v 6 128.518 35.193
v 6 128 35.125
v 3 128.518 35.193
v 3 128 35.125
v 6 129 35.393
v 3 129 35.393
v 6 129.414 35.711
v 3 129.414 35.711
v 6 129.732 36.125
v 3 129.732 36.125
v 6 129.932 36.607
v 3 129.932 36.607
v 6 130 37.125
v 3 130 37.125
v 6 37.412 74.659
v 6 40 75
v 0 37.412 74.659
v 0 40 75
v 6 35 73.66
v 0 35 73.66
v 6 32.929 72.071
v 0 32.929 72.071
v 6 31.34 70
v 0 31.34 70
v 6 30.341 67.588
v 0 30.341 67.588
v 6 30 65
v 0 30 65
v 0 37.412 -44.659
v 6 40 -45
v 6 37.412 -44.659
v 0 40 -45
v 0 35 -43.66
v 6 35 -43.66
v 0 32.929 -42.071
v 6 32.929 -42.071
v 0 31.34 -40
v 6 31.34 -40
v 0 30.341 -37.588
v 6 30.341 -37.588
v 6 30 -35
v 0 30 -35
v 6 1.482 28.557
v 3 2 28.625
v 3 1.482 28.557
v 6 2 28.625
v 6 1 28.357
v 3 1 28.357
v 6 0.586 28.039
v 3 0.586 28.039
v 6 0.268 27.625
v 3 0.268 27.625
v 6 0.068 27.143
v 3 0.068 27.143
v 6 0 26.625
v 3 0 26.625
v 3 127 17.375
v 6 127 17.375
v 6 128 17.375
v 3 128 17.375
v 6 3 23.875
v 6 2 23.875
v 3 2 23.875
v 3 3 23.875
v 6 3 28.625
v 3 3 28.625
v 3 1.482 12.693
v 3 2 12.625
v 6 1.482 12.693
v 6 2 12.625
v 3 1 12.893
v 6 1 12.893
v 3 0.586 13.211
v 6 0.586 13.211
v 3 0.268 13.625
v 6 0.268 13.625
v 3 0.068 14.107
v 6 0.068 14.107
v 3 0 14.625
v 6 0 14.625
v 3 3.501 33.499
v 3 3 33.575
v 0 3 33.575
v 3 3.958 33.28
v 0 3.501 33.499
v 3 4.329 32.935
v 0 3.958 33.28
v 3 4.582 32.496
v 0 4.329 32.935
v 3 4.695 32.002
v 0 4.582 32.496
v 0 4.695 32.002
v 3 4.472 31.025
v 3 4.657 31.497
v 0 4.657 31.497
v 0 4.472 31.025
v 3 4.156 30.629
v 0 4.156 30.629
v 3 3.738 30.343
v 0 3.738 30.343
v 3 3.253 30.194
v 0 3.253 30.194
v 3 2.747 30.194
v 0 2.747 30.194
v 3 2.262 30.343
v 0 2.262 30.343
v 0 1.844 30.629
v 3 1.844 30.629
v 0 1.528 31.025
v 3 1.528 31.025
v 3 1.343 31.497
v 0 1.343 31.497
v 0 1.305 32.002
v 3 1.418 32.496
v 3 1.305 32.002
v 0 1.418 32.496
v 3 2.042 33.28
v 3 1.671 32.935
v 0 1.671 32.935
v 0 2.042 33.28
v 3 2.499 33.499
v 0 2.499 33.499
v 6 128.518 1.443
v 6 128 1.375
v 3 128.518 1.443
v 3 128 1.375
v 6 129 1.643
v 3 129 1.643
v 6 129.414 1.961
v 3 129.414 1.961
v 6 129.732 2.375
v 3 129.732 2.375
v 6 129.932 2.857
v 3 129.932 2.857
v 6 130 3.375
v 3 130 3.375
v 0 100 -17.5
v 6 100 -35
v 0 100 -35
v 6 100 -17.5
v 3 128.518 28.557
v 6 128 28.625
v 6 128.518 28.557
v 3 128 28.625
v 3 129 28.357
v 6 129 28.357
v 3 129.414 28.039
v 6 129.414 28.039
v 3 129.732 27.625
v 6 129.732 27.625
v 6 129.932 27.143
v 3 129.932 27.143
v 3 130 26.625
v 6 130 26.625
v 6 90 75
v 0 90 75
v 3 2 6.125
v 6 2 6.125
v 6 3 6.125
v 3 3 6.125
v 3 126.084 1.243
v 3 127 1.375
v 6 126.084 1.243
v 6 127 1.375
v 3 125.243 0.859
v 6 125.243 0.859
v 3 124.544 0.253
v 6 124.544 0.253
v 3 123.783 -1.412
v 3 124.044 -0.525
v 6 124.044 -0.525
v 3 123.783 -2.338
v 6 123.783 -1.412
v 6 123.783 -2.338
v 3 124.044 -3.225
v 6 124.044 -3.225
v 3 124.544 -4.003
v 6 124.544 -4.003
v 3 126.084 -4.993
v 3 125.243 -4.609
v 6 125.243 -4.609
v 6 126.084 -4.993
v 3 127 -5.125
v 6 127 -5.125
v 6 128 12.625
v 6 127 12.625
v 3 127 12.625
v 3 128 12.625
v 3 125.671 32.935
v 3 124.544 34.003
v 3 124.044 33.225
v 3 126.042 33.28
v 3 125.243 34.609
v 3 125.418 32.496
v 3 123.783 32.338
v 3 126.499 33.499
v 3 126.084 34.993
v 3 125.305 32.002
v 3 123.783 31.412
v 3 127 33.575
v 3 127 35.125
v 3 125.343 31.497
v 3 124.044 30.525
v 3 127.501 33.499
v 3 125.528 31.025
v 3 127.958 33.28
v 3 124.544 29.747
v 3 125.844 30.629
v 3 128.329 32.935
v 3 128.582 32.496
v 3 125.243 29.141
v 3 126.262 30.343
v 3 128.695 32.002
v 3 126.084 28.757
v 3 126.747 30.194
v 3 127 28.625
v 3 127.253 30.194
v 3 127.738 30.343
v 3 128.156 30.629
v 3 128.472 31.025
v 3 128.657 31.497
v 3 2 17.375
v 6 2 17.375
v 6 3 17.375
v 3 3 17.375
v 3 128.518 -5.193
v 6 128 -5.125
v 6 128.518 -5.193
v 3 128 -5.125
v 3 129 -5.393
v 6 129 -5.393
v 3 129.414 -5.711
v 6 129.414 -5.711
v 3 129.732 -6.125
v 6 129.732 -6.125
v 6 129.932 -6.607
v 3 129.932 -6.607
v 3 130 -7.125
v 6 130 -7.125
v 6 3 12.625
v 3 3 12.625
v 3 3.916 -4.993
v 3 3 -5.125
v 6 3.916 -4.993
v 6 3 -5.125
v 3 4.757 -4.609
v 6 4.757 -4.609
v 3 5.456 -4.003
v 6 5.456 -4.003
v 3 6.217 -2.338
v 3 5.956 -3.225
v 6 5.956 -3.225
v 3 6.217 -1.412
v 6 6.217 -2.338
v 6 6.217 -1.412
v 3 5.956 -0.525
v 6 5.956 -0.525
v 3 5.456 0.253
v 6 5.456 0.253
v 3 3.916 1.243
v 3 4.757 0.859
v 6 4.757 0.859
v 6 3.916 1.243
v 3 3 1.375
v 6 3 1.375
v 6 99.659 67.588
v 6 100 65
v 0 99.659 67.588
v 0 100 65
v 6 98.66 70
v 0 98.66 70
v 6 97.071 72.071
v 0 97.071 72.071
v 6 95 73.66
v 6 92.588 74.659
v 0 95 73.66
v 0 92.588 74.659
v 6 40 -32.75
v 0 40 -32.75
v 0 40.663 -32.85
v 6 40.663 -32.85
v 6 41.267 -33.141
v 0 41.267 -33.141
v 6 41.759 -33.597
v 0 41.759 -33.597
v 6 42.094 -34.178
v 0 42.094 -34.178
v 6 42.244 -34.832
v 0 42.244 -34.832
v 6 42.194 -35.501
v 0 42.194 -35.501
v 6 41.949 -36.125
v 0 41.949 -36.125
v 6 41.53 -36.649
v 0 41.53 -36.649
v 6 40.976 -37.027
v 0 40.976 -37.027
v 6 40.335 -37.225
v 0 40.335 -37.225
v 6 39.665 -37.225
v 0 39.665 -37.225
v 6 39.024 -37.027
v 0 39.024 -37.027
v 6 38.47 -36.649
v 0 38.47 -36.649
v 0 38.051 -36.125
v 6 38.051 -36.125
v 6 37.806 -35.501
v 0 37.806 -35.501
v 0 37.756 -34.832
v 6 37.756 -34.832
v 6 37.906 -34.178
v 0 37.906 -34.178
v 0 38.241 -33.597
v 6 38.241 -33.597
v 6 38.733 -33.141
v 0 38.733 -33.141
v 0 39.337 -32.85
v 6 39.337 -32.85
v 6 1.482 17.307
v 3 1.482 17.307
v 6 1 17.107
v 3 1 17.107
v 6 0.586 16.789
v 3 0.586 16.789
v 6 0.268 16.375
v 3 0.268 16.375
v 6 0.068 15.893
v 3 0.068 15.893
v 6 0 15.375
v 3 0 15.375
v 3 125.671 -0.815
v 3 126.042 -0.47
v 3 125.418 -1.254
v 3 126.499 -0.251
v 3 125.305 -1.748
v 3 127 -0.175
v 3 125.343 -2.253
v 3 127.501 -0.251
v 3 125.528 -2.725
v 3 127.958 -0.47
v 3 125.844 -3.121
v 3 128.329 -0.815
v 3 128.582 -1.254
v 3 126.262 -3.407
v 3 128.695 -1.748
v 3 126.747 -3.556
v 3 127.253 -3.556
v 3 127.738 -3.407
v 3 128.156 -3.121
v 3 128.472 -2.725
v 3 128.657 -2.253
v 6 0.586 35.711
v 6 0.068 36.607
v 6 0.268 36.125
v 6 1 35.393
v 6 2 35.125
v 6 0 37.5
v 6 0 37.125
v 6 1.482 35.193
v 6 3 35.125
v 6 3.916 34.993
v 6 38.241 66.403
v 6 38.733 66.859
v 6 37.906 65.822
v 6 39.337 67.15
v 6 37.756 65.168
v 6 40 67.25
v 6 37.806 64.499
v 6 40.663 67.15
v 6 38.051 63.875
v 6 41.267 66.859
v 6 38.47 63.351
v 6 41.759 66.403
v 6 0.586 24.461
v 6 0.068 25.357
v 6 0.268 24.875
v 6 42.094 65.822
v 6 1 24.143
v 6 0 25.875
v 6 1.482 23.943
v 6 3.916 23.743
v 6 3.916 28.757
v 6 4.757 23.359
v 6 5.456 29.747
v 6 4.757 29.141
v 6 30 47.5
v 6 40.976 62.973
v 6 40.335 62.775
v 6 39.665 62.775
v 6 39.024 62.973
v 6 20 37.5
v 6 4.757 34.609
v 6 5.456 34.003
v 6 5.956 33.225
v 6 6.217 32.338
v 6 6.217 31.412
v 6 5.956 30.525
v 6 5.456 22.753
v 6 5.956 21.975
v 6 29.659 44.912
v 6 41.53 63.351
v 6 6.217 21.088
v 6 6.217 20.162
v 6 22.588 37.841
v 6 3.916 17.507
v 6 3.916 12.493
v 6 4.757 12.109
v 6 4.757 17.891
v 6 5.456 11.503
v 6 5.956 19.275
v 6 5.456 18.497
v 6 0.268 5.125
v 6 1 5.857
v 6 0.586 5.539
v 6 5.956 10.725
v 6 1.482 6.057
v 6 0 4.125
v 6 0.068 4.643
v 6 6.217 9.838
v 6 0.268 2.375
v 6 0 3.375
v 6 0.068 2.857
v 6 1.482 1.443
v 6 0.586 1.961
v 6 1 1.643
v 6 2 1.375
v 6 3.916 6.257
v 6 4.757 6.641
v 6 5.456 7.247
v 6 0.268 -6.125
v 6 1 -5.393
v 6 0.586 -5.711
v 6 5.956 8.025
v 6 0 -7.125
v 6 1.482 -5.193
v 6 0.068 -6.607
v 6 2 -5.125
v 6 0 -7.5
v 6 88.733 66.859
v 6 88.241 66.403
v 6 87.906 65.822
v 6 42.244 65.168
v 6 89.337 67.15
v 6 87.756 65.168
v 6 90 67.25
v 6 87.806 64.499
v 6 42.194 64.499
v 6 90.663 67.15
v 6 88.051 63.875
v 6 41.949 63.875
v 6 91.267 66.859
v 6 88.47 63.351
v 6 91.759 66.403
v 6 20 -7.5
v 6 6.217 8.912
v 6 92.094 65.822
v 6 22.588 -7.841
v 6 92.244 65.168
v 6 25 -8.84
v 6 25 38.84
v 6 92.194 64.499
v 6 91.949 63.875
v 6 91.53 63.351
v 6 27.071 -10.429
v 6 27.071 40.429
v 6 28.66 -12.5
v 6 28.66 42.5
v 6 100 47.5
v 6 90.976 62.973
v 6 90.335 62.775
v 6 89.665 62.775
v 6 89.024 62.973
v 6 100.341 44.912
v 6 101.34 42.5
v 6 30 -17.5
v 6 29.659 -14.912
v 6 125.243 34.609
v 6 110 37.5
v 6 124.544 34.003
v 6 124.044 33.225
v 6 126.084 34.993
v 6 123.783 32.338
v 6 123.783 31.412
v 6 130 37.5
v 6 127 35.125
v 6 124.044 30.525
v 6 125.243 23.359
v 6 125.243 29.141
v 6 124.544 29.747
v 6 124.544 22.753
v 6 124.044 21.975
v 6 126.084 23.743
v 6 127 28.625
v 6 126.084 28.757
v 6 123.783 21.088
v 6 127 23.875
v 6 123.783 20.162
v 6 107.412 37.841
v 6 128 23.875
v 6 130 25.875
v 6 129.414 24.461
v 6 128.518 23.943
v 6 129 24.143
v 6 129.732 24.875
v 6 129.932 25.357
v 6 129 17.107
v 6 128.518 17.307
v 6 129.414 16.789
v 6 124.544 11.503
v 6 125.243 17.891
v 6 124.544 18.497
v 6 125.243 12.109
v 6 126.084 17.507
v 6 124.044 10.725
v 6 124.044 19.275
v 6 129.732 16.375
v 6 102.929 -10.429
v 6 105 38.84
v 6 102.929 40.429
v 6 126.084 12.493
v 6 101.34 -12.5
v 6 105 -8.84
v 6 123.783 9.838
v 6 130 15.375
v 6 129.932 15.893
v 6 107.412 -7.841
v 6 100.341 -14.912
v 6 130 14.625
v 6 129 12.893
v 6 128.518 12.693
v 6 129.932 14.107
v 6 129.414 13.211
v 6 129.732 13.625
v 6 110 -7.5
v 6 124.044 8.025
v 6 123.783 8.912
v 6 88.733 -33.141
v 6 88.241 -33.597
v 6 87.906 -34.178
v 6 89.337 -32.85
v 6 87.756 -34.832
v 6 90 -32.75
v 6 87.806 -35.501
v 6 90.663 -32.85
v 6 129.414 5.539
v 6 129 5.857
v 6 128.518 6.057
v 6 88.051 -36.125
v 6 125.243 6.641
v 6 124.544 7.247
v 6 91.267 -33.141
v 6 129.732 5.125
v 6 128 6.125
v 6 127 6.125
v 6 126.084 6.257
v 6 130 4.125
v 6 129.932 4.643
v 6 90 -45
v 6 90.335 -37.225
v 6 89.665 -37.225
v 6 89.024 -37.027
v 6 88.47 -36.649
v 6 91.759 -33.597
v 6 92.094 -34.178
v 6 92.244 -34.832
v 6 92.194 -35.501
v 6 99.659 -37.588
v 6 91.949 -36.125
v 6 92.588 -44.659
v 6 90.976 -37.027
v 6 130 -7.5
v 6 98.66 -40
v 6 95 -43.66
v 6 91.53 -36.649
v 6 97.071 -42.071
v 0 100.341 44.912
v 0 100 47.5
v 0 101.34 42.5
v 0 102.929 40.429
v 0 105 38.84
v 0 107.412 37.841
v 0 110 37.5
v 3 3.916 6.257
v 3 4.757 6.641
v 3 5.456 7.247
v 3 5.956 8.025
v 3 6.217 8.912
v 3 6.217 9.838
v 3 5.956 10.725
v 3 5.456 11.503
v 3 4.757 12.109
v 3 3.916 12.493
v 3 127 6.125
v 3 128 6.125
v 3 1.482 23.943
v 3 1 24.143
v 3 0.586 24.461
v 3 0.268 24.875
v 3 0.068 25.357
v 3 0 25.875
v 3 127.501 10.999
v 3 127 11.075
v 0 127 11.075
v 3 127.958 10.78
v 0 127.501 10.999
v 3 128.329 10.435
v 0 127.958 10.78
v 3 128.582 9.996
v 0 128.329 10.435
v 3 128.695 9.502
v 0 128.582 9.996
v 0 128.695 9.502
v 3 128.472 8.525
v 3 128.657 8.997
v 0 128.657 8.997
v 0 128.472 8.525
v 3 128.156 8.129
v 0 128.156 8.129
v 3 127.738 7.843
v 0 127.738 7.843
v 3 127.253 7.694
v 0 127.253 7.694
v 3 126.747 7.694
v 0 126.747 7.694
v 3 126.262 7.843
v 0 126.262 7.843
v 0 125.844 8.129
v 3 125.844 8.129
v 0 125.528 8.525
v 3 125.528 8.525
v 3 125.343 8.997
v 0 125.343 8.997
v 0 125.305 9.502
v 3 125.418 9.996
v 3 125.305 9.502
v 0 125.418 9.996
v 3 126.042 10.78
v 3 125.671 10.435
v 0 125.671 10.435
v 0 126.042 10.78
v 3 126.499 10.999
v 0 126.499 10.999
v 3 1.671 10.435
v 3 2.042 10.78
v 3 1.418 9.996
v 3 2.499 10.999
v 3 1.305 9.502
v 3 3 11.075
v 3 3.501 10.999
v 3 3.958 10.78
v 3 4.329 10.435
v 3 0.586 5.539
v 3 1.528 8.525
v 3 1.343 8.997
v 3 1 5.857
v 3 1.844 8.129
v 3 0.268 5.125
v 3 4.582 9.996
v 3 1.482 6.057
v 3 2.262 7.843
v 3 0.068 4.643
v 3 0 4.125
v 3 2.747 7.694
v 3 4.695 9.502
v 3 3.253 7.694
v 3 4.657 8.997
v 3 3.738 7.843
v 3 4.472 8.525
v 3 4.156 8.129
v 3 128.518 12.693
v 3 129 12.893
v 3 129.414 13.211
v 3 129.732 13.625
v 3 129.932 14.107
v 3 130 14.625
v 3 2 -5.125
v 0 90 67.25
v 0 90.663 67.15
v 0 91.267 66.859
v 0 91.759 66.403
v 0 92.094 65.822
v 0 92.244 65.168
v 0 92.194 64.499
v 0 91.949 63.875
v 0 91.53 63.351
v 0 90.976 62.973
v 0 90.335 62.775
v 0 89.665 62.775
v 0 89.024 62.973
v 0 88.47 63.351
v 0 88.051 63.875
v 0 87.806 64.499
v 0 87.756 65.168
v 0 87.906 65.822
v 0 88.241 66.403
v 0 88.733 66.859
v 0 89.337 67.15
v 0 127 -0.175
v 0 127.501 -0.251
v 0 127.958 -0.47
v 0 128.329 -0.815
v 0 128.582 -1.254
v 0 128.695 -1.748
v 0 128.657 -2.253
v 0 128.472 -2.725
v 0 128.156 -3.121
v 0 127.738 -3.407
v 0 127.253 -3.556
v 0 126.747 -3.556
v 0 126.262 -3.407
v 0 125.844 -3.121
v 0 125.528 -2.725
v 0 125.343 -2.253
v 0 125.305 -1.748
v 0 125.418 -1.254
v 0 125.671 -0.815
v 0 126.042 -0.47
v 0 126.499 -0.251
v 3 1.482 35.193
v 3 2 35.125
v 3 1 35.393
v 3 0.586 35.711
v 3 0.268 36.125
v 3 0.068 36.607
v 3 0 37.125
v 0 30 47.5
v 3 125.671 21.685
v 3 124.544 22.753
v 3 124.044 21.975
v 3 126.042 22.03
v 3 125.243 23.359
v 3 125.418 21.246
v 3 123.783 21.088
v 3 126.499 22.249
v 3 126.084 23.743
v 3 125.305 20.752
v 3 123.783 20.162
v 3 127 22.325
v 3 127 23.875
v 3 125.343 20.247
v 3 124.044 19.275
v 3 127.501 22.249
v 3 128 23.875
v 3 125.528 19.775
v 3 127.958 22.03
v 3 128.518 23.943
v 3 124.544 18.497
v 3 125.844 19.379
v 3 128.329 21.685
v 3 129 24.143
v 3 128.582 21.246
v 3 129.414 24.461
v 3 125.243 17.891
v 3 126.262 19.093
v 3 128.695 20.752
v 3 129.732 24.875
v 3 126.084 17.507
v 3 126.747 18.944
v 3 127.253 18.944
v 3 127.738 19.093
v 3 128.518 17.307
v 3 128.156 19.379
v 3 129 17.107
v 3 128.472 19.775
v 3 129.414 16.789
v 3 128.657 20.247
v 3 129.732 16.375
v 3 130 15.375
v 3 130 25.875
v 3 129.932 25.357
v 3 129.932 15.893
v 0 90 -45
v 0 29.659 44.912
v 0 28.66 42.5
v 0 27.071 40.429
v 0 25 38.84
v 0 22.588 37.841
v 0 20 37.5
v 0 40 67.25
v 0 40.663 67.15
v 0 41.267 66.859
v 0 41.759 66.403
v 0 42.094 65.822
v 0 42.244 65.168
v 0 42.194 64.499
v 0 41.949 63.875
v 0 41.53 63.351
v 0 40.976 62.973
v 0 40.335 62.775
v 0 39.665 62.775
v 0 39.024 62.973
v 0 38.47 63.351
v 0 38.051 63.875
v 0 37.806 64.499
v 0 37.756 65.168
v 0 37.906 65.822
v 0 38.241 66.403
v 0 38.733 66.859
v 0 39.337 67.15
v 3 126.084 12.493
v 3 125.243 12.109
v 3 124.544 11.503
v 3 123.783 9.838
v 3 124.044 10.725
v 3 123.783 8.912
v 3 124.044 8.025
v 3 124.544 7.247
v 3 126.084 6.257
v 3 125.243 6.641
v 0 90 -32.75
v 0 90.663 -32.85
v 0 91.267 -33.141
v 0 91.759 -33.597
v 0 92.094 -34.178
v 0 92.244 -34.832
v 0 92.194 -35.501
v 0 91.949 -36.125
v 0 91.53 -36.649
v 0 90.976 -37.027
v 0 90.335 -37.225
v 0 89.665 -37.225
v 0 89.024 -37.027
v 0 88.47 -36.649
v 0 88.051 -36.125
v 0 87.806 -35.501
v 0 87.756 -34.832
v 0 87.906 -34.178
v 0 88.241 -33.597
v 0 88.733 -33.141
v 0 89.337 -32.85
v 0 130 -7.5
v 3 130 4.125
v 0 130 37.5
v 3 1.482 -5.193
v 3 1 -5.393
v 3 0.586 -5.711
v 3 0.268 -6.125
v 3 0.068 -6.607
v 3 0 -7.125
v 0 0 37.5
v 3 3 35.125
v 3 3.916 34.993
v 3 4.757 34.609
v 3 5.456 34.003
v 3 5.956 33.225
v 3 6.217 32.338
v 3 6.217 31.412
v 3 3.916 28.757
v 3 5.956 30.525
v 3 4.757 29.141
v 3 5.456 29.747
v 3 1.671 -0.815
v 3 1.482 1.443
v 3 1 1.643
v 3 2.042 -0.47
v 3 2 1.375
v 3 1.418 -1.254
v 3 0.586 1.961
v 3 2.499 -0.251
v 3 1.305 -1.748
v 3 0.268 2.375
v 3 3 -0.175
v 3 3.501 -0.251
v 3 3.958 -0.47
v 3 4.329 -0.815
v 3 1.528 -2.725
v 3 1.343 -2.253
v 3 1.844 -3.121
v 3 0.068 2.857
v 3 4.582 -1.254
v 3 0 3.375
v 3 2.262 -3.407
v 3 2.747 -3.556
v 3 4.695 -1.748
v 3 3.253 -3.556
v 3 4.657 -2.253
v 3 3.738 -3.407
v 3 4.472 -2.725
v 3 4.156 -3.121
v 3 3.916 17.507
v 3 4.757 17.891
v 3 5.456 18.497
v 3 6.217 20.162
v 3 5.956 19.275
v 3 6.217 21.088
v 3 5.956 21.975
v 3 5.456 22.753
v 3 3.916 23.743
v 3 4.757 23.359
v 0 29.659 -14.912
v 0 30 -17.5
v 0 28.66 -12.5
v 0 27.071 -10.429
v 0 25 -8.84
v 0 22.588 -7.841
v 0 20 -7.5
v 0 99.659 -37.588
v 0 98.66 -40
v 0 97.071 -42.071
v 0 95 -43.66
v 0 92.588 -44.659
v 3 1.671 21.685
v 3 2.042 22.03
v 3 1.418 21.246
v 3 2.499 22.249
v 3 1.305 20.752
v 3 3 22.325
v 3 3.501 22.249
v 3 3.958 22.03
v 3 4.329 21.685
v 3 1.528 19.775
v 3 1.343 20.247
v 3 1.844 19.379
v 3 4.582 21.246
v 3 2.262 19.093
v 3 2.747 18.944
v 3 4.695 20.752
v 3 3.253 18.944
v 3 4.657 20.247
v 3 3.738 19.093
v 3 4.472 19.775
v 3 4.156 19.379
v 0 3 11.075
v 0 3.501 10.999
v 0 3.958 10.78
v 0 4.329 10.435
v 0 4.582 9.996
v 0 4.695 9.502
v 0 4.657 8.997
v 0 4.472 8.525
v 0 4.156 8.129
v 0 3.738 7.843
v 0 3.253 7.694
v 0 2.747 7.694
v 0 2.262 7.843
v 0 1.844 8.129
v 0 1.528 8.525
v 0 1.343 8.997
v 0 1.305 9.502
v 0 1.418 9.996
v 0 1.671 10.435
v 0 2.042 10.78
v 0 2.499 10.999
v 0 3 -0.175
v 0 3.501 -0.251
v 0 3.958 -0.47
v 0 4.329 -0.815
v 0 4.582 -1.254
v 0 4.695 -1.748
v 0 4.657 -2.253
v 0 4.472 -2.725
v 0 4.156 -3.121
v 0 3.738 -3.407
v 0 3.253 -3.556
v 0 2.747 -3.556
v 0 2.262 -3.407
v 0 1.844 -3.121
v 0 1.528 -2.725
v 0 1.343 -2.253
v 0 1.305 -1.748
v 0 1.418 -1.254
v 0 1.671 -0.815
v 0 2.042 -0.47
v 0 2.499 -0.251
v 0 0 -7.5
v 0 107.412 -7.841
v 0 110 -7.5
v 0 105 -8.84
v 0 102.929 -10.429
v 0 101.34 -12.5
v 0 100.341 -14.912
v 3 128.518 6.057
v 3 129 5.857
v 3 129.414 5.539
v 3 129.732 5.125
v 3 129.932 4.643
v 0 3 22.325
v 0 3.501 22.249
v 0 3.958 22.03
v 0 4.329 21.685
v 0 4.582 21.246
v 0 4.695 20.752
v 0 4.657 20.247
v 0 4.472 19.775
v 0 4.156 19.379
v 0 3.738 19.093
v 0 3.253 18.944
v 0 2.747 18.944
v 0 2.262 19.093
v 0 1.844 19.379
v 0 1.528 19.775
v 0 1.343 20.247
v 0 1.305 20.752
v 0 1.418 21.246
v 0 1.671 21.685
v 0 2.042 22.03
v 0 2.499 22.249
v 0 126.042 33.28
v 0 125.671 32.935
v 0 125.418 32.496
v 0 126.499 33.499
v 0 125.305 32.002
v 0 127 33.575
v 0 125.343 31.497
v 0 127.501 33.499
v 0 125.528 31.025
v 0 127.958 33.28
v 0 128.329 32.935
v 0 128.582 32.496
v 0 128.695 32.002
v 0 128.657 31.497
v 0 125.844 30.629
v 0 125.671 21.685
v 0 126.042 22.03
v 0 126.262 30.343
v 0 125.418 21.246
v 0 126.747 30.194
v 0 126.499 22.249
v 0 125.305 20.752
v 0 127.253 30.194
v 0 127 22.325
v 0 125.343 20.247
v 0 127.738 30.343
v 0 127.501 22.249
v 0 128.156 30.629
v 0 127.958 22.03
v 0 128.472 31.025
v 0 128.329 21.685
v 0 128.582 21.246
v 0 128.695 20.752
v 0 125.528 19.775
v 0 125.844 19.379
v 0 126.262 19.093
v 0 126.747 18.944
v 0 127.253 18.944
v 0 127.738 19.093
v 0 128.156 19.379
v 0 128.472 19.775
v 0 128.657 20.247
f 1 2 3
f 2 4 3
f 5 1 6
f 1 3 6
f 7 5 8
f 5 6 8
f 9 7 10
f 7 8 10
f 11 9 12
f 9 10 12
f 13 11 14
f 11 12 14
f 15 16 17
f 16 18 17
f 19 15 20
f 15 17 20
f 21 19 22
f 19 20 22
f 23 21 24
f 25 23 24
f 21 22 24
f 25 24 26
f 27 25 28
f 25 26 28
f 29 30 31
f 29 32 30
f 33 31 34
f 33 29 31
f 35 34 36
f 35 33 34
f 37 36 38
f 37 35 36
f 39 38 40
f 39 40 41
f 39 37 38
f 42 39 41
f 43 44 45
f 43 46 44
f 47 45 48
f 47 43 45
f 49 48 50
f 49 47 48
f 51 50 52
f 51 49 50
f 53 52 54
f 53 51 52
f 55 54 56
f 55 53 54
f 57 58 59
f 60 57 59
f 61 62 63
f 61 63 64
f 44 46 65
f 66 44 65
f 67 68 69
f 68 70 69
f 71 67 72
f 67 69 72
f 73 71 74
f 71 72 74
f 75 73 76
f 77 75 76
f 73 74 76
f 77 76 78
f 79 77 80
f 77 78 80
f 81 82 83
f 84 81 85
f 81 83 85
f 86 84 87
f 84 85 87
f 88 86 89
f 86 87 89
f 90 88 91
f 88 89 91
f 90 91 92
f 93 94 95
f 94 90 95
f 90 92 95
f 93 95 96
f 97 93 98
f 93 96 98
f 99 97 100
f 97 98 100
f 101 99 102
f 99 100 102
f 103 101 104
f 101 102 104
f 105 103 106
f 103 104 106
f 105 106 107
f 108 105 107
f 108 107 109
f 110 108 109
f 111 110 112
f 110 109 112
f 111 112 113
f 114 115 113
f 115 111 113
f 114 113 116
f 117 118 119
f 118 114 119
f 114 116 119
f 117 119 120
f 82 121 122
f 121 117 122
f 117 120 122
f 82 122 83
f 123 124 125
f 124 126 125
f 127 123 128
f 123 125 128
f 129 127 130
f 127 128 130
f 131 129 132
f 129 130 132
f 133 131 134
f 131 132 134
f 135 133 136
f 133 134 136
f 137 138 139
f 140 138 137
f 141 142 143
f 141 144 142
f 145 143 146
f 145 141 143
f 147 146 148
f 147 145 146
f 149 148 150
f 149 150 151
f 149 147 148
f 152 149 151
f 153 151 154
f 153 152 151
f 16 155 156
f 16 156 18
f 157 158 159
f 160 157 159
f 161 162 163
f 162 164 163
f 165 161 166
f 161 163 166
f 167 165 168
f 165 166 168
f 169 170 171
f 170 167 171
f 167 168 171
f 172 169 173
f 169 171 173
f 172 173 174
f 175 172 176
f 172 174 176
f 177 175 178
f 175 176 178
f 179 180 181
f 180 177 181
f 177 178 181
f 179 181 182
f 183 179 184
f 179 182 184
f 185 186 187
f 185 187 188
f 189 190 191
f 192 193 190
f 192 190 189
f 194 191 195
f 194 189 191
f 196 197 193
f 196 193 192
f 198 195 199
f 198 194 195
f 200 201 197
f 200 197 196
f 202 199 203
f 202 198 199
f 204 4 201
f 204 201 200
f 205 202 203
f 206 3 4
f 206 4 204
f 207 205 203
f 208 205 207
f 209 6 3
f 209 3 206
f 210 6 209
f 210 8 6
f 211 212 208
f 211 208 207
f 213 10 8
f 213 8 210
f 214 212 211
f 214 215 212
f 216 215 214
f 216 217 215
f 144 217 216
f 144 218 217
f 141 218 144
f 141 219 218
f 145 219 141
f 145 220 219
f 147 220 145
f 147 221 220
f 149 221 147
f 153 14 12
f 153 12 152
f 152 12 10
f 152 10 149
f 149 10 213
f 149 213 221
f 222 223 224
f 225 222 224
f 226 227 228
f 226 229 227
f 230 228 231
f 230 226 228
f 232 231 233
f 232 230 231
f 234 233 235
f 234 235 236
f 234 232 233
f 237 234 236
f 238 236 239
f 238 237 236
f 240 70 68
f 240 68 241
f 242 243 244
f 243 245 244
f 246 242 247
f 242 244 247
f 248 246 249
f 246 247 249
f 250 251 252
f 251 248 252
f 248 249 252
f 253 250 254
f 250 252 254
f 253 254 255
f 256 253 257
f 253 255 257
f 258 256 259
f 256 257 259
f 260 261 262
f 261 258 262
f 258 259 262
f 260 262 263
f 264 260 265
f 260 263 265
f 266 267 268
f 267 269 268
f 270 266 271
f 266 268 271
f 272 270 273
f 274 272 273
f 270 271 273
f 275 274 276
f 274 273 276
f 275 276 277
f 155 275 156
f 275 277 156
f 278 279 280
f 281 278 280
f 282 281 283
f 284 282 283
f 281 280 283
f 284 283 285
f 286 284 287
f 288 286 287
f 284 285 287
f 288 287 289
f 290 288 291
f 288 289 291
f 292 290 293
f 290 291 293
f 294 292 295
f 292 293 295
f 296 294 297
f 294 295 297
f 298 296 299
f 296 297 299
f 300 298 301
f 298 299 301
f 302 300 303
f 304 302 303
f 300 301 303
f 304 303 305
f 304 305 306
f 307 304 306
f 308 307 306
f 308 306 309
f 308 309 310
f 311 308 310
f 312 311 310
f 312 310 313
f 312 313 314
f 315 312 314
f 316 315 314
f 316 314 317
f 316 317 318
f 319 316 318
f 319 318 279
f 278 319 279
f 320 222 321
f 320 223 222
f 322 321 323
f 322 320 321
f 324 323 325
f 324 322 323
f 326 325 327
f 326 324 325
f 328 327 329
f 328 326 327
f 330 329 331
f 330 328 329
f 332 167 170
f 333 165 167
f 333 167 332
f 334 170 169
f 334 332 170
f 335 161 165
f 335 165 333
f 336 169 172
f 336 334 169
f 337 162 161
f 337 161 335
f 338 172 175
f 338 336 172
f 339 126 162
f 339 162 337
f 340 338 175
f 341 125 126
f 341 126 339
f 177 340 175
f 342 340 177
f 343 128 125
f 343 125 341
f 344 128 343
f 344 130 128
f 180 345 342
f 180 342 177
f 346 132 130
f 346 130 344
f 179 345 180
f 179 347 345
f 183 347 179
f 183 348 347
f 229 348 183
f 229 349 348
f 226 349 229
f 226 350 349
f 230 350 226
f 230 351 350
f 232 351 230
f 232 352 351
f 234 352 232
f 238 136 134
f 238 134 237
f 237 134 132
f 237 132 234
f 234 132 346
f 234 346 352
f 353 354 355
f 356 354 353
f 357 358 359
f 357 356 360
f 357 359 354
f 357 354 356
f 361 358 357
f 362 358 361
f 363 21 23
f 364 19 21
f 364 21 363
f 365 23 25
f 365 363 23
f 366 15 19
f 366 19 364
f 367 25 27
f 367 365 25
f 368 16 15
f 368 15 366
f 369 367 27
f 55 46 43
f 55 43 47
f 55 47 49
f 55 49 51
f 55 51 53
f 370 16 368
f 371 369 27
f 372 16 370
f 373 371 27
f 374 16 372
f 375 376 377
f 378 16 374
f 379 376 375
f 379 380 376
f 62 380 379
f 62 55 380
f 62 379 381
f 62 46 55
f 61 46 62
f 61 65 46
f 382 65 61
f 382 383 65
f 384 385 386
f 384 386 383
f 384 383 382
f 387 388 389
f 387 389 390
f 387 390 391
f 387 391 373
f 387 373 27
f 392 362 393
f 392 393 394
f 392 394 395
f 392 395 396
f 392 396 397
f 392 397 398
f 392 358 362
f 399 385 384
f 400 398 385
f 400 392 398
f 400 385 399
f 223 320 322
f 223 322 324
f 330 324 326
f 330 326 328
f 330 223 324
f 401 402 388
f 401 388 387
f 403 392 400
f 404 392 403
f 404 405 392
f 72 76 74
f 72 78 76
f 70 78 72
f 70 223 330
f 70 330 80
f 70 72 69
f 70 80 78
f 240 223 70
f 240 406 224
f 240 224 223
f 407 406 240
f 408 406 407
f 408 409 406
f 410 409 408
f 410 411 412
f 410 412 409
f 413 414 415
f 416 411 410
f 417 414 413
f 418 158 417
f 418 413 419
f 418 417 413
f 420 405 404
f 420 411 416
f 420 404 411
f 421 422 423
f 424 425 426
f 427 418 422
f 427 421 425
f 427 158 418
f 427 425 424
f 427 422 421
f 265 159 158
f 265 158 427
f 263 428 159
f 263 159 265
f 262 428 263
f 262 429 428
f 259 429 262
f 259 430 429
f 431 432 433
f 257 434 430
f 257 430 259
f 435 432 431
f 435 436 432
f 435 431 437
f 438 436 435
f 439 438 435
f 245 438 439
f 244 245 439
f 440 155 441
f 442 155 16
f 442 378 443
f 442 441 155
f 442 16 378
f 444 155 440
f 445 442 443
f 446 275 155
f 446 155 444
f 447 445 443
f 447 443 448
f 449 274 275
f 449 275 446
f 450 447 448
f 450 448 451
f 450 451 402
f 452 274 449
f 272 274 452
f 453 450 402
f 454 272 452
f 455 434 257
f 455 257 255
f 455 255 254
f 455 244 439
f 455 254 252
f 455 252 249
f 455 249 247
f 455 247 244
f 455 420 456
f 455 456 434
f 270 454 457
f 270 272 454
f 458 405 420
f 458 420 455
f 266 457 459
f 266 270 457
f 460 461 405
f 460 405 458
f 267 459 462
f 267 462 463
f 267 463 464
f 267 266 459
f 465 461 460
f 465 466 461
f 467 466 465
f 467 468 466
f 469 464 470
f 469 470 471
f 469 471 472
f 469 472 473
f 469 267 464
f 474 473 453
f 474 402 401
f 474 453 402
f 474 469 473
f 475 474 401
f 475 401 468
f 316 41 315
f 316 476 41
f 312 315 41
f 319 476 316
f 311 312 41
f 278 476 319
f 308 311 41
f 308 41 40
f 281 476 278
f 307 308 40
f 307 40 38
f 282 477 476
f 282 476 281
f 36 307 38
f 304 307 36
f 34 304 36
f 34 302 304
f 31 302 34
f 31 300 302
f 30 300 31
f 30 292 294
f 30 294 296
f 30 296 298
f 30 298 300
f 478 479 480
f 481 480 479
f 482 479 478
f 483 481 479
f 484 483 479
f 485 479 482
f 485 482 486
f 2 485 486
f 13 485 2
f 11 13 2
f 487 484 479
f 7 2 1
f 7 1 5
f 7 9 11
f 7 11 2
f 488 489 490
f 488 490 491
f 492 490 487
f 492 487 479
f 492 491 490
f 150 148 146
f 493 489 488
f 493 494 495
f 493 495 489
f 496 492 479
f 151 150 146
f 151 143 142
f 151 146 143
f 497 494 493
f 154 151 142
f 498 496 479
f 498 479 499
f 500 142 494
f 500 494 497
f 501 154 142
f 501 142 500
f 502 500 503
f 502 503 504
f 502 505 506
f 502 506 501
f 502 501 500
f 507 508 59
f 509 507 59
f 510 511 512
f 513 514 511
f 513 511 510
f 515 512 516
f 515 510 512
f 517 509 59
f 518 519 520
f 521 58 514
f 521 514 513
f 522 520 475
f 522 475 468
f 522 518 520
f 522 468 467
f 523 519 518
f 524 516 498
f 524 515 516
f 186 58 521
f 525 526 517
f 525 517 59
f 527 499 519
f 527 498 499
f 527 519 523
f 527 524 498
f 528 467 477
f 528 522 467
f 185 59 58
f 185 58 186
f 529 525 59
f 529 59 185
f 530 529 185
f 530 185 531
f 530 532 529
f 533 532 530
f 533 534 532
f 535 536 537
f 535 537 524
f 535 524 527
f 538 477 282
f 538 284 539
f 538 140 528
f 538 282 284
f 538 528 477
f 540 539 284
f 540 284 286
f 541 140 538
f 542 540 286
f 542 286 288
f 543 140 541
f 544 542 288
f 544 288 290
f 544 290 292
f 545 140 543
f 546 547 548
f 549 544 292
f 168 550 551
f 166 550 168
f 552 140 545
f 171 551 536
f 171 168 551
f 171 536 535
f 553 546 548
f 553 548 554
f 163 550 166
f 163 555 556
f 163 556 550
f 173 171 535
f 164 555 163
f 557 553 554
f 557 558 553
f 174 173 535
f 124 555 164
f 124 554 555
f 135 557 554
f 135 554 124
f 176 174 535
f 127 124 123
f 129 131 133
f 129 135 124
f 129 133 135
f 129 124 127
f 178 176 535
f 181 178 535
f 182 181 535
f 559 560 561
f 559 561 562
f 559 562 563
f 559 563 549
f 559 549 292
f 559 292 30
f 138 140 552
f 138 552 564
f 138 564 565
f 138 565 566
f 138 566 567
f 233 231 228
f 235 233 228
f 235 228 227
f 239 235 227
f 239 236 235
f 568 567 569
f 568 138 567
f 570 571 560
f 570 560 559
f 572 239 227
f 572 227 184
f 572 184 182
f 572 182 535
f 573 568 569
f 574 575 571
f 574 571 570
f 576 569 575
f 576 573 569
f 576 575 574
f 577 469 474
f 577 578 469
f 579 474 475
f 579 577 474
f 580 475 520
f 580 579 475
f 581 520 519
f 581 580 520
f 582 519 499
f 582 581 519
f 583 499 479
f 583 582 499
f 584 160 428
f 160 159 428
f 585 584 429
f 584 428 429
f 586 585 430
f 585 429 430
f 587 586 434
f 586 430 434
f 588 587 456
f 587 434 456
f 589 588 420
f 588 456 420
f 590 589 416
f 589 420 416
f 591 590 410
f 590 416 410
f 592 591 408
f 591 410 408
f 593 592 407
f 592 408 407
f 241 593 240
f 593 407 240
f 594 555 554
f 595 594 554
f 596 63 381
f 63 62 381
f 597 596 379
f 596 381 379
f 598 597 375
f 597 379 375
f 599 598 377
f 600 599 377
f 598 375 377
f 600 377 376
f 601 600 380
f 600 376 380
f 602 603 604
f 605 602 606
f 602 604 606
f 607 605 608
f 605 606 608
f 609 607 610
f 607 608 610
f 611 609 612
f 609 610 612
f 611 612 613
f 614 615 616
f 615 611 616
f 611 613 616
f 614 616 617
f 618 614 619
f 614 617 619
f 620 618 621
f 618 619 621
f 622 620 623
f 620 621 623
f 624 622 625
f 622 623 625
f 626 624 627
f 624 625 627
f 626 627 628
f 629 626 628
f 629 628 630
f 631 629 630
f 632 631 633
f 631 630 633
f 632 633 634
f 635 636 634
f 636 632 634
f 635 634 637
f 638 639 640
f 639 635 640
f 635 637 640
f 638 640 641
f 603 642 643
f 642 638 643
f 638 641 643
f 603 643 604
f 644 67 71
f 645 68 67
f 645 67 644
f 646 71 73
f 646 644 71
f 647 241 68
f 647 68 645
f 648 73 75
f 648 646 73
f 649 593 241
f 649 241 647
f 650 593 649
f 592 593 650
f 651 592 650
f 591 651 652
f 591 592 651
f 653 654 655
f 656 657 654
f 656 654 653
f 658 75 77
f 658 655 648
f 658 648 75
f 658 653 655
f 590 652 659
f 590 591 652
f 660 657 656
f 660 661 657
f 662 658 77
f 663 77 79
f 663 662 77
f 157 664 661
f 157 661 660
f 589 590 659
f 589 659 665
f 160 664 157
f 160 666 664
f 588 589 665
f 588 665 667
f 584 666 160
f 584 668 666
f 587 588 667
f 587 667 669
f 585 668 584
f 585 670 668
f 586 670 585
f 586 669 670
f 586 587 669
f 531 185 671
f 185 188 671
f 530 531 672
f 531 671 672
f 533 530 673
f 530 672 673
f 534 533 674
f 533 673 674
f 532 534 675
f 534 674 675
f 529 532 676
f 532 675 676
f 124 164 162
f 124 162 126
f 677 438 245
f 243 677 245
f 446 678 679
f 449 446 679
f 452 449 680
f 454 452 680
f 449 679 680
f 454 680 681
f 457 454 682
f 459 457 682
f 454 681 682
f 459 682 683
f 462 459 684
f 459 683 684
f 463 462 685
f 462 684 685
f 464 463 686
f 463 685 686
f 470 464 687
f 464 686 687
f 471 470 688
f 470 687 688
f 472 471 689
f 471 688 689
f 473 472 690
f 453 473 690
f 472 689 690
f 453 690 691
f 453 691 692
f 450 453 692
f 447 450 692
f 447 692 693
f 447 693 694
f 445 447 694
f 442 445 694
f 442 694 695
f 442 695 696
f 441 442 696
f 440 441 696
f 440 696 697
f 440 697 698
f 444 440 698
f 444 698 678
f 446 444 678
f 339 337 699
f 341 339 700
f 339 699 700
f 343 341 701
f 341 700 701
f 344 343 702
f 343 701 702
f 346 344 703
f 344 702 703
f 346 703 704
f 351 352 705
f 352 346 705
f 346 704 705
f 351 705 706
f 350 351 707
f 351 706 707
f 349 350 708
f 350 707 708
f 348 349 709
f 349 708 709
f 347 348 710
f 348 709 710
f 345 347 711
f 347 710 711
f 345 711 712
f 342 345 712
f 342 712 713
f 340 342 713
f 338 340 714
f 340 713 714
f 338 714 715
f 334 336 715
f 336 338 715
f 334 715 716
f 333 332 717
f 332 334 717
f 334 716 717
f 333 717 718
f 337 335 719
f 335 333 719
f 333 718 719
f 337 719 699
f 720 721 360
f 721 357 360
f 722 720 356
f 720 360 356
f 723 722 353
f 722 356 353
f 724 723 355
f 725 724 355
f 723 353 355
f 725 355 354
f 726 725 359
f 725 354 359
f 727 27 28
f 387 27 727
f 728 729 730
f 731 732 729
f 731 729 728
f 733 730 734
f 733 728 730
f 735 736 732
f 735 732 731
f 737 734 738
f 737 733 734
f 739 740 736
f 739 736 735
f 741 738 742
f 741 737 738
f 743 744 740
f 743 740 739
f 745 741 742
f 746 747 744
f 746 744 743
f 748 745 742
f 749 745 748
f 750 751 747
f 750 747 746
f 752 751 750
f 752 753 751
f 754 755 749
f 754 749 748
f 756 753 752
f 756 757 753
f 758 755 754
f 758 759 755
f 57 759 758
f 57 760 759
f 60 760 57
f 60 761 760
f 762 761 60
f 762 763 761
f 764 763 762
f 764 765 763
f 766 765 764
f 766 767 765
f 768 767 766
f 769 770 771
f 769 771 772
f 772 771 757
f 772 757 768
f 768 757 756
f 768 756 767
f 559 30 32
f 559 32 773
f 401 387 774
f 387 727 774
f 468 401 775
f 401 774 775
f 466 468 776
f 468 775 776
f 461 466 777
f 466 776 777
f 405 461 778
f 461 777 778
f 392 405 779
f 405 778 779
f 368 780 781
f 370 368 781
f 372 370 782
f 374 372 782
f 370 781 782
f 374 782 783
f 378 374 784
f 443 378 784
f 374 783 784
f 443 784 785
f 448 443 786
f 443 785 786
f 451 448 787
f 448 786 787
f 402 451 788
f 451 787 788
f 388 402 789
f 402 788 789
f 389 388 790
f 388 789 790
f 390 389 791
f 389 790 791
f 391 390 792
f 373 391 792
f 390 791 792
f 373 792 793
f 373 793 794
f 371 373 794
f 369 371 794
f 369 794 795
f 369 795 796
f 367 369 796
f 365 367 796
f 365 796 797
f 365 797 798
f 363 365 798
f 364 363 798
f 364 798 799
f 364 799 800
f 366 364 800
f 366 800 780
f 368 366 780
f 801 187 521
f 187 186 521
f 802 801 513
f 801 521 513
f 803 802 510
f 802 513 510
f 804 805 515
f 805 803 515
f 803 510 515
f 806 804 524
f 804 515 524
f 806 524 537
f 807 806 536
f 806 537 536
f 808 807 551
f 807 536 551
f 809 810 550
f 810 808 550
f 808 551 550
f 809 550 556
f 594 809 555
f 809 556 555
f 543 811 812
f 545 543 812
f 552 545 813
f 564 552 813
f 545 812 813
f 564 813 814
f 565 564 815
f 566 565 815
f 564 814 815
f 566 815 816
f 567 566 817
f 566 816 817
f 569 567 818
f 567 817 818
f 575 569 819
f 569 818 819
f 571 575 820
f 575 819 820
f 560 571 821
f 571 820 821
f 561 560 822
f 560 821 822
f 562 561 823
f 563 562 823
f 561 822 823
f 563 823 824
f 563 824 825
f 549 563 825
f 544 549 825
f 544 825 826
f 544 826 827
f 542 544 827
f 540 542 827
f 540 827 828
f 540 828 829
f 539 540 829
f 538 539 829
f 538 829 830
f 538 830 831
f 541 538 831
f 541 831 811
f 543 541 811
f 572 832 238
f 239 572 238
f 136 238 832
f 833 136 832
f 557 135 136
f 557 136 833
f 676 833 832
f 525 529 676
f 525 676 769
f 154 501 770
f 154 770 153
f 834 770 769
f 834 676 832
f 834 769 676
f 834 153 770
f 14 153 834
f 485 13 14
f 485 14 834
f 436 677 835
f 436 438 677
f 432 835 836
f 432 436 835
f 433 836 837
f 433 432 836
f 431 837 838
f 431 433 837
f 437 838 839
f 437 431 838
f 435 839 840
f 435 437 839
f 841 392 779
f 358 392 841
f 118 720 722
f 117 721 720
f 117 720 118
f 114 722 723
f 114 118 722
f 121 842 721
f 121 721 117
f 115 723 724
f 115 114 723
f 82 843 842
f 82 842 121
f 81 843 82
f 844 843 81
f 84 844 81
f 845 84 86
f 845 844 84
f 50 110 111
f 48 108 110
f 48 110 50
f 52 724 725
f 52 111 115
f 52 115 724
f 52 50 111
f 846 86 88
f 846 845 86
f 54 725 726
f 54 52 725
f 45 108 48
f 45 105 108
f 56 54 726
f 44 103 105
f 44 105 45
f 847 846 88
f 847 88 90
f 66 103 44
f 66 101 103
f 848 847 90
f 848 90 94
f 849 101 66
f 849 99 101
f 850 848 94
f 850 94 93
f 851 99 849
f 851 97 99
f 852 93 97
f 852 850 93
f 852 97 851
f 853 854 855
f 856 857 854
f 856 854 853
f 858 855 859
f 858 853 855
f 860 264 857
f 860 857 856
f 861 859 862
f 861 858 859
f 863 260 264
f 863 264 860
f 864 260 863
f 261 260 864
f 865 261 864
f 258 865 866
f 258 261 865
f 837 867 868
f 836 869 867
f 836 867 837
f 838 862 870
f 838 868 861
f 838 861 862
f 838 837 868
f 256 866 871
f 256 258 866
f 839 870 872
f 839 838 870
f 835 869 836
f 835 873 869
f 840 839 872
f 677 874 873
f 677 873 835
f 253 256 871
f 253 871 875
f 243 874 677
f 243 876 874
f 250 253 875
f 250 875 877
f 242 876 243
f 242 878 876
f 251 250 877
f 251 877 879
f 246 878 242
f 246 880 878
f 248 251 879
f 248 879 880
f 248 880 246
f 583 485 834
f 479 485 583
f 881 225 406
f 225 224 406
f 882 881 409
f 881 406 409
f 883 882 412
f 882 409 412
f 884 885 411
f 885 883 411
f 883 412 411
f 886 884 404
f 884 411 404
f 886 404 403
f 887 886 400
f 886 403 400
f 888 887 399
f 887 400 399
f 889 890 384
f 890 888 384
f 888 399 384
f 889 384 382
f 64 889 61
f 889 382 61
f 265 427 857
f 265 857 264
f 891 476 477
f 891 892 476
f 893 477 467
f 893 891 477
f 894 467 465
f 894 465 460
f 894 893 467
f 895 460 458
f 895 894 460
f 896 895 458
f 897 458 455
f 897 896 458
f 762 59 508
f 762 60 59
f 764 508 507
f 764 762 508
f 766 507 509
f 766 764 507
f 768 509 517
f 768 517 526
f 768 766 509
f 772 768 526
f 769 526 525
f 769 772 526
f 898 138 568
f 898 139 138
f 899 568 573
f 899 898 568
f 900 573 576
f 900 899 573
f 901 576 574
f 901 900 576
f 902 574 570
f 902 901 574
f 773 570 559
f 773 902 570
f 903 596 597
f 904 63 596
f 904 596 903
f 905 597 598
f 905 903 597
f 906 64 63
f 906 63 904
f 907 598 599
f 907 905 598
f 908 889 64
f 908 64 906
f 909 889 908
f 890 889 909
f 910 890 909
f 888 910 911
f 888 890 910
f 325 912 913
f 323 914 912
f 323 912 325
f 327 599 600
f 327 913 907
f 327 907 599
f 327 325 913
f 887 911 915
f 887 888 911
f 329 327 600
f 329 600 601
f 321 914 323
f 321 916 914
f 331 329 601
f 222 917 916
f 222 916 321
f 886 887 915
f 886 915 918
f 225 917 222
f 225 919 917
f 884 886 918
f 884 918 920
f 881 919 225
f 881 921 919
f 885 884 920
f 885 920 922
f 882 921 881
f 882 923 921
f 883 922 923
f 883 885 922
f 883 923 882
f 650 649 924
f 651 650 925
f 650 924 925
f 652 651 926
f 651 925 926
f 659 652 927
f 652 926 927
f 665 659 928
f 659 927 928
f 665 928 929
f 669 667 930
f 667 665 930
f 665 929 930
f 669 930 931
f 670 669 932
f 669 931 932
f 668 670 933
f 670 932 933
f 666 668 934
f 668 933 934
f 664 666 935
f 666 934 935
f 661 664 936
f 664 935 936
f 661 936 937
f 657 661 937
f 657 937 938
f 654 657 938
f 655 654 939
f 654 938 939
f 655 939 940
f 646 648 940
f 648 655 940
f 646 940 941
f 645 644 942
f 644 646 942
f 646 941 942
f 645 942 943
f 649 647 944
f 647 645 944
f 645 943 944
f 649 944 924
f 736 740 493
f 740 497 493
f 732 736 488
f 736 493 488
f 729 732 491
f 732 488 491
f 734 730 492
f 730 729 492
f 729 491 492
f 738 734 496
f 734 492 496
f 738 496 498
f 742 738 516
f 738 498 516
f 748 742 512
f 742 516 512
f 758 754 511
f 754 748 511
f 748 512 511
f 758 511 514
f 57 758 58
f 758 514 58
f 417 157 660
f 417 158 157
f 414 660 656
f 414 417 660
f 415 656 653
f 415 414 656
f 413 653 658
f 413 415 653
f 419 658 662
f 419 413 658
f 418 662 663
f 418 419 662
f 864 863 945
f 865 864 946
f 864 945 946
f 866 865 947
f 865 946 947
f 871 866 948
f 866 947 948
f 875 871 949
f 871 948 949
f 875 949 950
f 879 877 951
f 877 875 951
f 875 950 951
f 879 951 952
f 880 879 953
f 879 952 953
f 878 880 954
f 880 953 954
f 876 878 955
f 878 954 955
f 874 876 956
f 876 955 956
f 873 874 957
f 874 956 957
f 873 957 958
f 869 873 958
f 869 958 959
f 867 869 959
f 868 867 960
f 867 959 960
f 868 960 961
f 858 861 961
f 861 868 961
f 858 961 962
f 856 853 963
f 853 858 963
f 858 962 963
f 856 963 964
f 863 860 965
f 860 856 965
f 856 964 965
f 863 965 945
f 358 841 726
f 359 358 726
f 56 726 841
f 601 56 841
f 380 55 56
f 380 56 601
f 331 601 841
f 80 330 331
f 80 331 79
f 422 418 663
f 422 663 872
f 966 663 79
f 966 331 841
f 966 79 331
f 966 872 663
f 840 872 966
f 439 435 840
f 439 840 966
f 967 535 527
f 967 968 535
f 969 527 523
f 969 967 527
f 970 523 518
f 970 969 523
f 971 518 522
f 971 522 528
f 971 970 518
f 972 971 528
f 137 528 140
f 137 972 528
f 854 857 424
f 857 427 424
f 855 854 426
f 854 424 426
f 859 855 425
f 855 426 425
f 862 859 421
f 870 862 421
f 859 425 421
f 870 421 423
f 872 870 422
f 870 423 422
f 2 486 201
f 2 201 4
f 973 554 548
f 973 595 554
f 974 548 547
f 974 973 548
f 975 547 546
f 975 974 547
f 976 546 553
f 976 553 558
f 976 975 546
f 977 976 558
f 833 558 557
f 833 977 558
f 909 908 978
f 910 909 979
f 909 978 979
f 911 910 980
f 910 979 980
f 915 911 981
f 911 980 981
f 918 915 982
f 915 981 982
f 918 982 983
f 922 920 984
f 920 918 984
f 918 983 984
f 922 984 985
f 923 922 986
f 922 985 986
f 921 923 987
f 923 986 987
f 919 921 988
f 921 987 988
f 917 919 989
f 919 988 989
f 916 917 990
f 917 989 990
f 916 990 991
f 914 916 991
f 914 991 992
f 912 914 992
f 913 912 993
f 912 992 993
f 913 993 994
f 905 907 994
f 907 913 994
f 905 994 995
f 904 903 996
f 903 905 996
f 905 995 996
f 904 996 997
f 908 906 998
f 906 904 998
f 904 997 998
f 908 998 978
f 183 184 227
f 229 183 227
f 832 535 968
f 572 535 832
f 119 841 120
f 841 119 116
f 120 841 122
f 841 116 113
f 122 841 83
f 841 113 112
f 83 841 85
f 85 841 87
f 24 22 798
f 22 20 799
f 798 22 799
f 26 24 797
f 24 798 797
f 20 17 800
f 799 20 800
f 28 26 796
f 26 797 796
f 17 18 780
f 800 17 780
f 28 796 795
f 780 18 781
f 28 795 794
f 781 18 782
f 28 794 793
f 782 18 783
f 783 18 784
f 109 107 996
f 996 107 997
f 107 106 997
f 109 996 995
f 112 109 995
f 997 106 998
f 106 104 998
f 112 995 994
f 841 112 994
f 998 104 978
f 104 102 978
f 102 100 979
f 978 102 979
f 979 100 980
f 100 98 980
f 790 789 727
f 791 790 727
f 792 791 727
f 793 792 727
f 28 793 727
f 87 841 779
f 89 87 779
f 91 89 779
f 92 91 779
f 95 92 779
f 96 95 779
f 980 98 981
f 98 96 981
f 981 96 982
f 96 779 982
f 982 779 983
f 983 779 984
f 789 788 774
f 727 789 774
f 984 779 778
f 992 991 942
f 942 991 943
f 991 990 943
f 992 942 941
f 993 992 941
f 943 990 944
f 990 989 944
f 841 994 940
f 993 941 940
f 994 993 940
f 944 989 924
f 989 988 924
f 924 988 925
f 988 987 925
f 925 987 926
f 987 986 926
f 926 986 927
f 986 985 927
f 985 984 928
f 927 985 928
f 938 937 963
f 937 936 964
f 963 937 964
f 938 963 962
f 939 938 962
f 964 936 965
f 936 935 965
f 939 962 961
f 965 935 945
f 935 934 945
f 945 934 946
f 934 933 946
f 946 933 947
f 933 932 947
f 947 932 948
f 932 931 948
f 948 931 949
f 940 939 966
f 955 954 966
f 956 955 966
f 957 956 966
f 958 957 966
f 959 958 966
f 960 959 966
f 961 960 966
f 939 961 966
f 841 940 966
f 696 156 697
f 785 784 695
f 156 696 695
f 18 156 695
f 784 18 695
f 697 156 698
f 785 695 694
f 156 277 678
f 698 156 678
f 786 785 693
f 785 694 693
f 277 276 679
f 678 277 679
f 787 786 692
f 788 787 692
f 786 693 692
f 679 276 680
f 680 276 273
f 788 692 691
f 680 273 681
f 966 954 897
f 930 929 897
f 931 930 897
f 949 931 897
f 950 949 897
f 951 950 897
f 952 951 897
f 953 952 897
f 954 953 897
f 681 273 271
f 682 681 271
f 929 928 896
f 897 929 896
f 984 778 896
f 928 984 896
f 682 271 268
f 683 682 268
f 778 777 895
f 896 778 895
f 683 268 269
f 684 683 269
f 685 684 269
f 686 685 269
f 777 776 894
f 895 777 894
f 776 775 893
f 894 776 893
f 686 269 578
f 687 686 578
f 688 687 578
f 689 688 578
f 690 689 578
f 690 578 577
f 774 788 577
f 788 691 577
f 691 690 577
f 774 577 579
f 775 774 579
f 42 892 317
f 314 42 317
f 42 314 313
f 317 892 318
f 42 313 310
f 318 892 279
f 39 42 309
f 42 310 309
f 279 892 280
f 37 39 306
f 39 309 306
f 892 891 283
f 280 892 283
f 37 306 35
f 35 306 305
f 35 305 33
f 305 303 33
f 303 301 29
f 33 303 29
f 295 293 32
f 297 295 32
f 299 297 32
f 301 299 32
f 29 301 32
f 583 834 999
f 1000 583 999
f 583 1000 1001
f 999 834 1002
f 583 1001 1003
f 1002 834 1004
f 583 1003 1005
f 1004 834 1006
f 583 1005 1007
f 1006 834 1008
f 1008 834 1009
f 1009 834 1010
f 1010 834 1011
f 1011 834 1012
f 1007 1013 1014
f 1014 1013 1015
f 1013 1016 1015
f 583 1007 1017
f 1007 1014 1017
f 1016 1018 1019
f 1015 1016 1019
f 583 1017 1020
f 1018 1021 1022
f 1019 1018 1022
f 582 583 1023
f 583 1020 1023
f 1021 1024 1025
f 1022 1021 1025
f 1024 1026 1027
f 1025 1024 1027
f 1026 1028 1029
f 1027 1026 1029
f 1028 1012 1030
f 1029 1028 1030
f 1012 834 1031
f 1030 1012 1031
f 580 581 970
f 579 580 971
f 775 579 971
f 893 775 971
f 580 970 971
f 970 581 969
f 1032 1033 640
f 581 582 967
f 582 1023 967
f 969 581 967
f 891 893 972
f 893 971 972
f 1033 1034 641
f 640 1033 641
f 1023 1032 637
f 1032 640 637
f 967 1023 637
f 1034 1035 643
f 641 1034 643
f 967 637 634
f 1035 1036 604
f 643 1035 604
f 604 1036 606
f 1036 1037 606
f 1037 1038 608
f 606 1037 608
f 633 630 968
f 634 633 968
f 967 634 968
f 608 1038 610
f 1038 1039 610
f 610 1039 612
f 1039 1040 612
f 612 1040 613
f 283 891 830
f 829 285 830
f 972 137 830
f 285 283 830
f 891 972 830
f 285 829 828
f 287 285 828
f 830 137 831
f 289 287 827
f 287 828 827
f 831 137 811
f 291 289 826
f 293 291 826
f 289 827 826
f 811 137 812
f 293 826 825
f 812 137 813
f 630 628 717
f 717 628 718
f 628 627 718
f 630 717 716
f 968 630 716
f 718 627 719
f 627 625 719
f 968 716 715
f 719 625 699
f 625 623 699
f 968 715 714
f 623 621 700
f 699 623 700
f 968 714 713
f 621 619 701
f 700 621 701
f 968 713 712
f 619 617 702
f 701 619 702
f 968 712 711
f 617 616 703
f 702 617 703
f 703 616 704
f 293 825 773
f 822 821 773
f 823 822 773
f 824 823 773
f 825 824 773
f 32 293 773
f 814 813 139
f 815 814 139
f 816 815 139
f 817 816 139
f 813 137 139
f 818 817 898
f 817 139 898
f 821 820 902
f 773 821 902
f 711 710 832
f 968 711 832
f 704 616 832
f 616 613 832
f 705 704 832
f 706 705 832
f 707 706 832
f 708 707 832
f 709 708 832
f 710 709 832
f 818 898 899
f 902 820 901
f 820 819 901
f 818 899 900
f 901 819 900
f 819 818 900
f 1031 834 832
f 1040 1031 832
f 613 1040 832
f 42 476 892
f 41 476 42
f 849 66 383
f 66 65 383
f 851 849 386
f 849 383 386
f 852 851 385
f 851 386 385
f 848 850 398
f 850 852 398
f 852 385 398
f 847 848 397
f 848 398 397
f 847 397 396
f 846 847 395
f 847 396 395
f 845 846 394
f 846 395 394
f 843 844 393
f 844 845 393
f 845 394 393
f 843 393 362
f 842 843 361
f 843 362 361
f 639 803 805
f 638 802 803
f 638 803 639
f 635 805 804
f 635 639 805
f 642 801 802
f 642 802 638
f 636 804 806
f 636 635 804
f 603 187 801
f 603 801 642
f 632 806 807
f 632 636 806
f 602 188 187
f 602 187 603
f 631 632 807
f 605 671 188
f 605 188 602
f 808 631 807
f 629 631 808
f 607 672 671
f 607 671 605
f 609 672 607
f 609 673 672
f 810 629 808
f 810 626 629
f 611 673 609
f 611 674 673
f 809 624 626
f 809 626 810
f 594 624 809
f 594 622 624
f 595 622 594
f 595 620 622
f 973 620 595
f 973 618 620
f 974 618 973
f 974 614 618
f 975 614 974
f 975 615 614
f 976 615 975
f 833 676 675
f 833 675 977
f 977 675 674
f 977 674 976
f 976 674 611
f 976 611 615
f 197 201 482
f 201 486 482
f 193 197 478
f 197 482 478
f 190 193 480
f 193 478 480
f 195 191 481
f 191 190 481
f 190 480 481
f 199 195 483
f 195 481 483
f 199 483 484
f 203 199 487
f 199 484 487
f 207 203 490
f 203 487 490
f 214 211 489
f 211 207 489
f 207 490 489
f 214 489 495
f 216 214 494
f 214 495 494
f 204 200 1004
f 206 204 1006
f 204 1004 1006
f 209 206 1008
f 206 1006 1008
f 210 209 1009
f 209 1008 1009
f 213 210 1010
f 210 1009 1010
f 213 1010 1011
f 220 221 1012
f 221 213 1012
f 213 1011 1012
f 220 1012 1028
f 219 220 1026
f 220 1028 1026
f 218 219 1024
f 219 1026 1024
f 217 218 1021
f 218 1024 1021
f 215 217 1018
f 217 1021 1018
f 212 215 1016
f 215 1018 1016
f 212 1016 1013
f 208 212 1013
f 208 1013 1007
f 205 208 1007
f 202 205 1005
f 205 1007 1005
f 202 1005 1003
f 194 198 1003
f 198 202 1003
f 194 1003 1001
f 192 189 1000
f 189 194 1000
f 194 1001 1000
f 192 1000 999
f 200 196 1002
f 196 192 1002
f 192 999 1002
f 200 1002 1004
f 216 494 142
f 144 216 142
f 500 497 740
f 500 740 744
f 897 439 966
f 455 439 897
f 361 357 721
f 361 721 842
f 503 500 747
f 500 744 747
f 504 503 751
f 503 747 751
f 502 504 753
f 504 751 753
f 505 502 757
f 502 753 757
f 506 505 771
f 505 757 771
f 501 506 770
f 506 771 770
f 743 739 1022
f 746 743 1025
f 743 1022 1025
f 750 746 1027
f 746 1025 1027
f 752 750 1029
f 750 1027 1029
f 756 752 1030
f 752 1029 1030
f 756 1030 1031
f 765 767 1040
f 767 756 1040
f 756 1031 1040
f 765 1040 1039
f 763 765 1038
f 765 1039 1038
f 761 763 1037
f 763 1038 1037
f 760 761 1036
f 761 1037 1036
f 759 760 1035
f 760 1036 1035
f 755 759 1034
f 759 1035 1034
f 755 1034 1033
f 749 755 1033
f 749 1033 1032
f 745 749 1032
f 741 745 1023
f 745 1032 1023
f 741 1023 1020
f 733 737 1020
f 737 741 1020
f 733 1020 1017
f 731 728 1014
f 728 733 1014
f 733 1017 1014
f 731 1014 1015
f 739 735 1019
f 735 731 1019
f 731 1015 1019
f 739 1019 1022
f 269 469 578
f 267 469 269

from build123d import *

# Parameters (mm, degrees)
SKETCH_1_W                  = 6
SKETCH_1_H                  = 30
EXTRUDE_1_DEPTH             = 130
EXTRUDE_3_DEPTH             = 6
HOLE_WIZARD_M31_D           = 3.4
HOLE_WIZARD_M31_CBORE_D     = 6.5
HOLE_WIZARD_M31_CBORE_DEPTH = 3
HOLE_WIZARD_M41_D           = 4.5
FILLET_1_R                  = 10
SKETCH_17_W                 = 6.5
SKETCH_17_H                 = 5
CUT_EXTRUDE_1_DEPTH         = 3
FILLET_2_R                  = 2


with BuildPart() as part:
    # Эскиз1 → Бобышка-Вытянуть1 (new body)
    with BuildSketch(Plane(origin=(0, 0, 0), x_dir=(1, 0, 0), z_dir=(0, 1, 0))):
        with Locations((3, -15)):
            Rectangle(SKETCH_1_W, SKETCH_1_H)
    extrude(amount=EXTRUDE_1_DEPTH)

    # Эскиз11 → Бобышка-Вытянуть3 (add)
    with BuildSketch(Plane(origin=(6, 0, 0), x_dir=(0, 0, -1), z_dir=(1, 0, 0))):
        Polygon((-37.5, 124), (-37.5, 100), (-75, 100), (-75, 30), (-37.5, 30), (-37.5, 6), (-37.5, 0), (7.5, 0), (7.5, 6), (7.5, 30), (45, 30), (45, 100), (7.5, 100), (7.5, 124), (7.5, 130), (-37.5, 130), align=None)
    extrude(amount=-EXTRUDE_3_DEPTH)

    # Цековка для винта с внутренним шестигранником M31 (through all)
    with Locations(Plane(origin=(6, 0, 0), x_dir=(0, 0, -1), z_dir=(1, 0, 0))):
        with Locations((-31.875, 127), (-20.625, 127), (-9.375, 127), (1.875, 127), (-31.875, 3), (-20.625, 3), (-9.375, 3), (1.875, 3)):
            CounterBoreHole(HOLE_WIZARD_M31_D / 2, HOLE_WIZARD_M31_CBORE_D / 2, HOLE_WIZARD_M31_CBORE_DEPTH)

    # Отверстие с зазором M41 (through all)
    with Locations(Plane(origin=(6, 0, 0), x_dir=(0, 0, -1), z_dir=(1, 0, 0))):
        with Locations((-65, 90), (-65, 40), (35, 40), (35, 90)):
            Hole(HOLE_WIZARD_M41_D / 2)

    # Скругление1
    fillet_1_edges = [part.edges().sort_by_distance(p)[0] for p in [
        (3, 100, -7.5),
        (3, 100, -45),
        (3, 30, -45),
        (3, 30, -7.5),
        (3, 30, 37.5),
        (3, 30, 75),
        (3, 100, 75),
        (3, 100, 37.5),
    ]]
    fillet(fillet_1_edges, radius=FILLET_1_R)

    # Эскиз17 → Вырез-Вытянуть1 (cut)
    with BuildSketch(Plane(origin=(6, 0, 0), x_dir=(0, 0, -1), z_dir=(1, 0, 0))):
        with Locations((-9.375, 129.5)):
            Rectangle(SKETCH_17_W, SKETCH_17_H)
        with Locations((1.875, 129.5)):
            Rectangle(SKETCH_17_W, SKETCH_17_H)
        with Locations((-20.625, 129.5)):
            Rectangle(SKETCH_17_W, SKETCH_17_H)
        with Locations((-31.875, 129.5)):
            Rectangle(SKETCH_17_W, SKETCH_17_H)
        with Locations((-31.875, 0.5)):
            Rectangle(SKETCH_17_W, SKETCH_17_H)
        with Locations((-20.625, 0.5)):
            Rectangle(SKETCH_17_W, SKETCH_17_H)
        with Locations((-9.375, 0.5)):
            Rectangle(SKETCH_17_W, SKETCH_17_H)
        with Locations((1.875, 0.5)):
            Rectangle(SKETCH_17_W, SKETCH_17_H)
    extrude(amount=-CUT_EXTRUDE_1_DEPTH, mode=Mode.SUBTRACT)

    # Скругление2
    fillet_2_edges = [part.edges().sort_by_distance(p)[0] for p in [
        (4.5, 130, -5.125),
        (4.5, 130, 1.375),
        (4.5, 130, 6.125),
        (4.5, 130, 12.625),
        (4.5, 130, 17.375),
        (4.5, 130, 23.875),
        (4.5, 130, 28.625),
        (4.5, 130, 35.125),
        (4.5, 0, 35.125),
        (4.5, 0, 28.625),
        (4.5, 0, 23.875),
        (4.5, 0, 17.375),
        (4.5, 0, 12.625),
        (4.5, 0, 6.125),
        (4.5, 0, 1.375),
        (4.5, 0, -5.125),
    ]]
    fillet(fillet_2_edges, radius=FILLET_2_R)


solid = part.part
